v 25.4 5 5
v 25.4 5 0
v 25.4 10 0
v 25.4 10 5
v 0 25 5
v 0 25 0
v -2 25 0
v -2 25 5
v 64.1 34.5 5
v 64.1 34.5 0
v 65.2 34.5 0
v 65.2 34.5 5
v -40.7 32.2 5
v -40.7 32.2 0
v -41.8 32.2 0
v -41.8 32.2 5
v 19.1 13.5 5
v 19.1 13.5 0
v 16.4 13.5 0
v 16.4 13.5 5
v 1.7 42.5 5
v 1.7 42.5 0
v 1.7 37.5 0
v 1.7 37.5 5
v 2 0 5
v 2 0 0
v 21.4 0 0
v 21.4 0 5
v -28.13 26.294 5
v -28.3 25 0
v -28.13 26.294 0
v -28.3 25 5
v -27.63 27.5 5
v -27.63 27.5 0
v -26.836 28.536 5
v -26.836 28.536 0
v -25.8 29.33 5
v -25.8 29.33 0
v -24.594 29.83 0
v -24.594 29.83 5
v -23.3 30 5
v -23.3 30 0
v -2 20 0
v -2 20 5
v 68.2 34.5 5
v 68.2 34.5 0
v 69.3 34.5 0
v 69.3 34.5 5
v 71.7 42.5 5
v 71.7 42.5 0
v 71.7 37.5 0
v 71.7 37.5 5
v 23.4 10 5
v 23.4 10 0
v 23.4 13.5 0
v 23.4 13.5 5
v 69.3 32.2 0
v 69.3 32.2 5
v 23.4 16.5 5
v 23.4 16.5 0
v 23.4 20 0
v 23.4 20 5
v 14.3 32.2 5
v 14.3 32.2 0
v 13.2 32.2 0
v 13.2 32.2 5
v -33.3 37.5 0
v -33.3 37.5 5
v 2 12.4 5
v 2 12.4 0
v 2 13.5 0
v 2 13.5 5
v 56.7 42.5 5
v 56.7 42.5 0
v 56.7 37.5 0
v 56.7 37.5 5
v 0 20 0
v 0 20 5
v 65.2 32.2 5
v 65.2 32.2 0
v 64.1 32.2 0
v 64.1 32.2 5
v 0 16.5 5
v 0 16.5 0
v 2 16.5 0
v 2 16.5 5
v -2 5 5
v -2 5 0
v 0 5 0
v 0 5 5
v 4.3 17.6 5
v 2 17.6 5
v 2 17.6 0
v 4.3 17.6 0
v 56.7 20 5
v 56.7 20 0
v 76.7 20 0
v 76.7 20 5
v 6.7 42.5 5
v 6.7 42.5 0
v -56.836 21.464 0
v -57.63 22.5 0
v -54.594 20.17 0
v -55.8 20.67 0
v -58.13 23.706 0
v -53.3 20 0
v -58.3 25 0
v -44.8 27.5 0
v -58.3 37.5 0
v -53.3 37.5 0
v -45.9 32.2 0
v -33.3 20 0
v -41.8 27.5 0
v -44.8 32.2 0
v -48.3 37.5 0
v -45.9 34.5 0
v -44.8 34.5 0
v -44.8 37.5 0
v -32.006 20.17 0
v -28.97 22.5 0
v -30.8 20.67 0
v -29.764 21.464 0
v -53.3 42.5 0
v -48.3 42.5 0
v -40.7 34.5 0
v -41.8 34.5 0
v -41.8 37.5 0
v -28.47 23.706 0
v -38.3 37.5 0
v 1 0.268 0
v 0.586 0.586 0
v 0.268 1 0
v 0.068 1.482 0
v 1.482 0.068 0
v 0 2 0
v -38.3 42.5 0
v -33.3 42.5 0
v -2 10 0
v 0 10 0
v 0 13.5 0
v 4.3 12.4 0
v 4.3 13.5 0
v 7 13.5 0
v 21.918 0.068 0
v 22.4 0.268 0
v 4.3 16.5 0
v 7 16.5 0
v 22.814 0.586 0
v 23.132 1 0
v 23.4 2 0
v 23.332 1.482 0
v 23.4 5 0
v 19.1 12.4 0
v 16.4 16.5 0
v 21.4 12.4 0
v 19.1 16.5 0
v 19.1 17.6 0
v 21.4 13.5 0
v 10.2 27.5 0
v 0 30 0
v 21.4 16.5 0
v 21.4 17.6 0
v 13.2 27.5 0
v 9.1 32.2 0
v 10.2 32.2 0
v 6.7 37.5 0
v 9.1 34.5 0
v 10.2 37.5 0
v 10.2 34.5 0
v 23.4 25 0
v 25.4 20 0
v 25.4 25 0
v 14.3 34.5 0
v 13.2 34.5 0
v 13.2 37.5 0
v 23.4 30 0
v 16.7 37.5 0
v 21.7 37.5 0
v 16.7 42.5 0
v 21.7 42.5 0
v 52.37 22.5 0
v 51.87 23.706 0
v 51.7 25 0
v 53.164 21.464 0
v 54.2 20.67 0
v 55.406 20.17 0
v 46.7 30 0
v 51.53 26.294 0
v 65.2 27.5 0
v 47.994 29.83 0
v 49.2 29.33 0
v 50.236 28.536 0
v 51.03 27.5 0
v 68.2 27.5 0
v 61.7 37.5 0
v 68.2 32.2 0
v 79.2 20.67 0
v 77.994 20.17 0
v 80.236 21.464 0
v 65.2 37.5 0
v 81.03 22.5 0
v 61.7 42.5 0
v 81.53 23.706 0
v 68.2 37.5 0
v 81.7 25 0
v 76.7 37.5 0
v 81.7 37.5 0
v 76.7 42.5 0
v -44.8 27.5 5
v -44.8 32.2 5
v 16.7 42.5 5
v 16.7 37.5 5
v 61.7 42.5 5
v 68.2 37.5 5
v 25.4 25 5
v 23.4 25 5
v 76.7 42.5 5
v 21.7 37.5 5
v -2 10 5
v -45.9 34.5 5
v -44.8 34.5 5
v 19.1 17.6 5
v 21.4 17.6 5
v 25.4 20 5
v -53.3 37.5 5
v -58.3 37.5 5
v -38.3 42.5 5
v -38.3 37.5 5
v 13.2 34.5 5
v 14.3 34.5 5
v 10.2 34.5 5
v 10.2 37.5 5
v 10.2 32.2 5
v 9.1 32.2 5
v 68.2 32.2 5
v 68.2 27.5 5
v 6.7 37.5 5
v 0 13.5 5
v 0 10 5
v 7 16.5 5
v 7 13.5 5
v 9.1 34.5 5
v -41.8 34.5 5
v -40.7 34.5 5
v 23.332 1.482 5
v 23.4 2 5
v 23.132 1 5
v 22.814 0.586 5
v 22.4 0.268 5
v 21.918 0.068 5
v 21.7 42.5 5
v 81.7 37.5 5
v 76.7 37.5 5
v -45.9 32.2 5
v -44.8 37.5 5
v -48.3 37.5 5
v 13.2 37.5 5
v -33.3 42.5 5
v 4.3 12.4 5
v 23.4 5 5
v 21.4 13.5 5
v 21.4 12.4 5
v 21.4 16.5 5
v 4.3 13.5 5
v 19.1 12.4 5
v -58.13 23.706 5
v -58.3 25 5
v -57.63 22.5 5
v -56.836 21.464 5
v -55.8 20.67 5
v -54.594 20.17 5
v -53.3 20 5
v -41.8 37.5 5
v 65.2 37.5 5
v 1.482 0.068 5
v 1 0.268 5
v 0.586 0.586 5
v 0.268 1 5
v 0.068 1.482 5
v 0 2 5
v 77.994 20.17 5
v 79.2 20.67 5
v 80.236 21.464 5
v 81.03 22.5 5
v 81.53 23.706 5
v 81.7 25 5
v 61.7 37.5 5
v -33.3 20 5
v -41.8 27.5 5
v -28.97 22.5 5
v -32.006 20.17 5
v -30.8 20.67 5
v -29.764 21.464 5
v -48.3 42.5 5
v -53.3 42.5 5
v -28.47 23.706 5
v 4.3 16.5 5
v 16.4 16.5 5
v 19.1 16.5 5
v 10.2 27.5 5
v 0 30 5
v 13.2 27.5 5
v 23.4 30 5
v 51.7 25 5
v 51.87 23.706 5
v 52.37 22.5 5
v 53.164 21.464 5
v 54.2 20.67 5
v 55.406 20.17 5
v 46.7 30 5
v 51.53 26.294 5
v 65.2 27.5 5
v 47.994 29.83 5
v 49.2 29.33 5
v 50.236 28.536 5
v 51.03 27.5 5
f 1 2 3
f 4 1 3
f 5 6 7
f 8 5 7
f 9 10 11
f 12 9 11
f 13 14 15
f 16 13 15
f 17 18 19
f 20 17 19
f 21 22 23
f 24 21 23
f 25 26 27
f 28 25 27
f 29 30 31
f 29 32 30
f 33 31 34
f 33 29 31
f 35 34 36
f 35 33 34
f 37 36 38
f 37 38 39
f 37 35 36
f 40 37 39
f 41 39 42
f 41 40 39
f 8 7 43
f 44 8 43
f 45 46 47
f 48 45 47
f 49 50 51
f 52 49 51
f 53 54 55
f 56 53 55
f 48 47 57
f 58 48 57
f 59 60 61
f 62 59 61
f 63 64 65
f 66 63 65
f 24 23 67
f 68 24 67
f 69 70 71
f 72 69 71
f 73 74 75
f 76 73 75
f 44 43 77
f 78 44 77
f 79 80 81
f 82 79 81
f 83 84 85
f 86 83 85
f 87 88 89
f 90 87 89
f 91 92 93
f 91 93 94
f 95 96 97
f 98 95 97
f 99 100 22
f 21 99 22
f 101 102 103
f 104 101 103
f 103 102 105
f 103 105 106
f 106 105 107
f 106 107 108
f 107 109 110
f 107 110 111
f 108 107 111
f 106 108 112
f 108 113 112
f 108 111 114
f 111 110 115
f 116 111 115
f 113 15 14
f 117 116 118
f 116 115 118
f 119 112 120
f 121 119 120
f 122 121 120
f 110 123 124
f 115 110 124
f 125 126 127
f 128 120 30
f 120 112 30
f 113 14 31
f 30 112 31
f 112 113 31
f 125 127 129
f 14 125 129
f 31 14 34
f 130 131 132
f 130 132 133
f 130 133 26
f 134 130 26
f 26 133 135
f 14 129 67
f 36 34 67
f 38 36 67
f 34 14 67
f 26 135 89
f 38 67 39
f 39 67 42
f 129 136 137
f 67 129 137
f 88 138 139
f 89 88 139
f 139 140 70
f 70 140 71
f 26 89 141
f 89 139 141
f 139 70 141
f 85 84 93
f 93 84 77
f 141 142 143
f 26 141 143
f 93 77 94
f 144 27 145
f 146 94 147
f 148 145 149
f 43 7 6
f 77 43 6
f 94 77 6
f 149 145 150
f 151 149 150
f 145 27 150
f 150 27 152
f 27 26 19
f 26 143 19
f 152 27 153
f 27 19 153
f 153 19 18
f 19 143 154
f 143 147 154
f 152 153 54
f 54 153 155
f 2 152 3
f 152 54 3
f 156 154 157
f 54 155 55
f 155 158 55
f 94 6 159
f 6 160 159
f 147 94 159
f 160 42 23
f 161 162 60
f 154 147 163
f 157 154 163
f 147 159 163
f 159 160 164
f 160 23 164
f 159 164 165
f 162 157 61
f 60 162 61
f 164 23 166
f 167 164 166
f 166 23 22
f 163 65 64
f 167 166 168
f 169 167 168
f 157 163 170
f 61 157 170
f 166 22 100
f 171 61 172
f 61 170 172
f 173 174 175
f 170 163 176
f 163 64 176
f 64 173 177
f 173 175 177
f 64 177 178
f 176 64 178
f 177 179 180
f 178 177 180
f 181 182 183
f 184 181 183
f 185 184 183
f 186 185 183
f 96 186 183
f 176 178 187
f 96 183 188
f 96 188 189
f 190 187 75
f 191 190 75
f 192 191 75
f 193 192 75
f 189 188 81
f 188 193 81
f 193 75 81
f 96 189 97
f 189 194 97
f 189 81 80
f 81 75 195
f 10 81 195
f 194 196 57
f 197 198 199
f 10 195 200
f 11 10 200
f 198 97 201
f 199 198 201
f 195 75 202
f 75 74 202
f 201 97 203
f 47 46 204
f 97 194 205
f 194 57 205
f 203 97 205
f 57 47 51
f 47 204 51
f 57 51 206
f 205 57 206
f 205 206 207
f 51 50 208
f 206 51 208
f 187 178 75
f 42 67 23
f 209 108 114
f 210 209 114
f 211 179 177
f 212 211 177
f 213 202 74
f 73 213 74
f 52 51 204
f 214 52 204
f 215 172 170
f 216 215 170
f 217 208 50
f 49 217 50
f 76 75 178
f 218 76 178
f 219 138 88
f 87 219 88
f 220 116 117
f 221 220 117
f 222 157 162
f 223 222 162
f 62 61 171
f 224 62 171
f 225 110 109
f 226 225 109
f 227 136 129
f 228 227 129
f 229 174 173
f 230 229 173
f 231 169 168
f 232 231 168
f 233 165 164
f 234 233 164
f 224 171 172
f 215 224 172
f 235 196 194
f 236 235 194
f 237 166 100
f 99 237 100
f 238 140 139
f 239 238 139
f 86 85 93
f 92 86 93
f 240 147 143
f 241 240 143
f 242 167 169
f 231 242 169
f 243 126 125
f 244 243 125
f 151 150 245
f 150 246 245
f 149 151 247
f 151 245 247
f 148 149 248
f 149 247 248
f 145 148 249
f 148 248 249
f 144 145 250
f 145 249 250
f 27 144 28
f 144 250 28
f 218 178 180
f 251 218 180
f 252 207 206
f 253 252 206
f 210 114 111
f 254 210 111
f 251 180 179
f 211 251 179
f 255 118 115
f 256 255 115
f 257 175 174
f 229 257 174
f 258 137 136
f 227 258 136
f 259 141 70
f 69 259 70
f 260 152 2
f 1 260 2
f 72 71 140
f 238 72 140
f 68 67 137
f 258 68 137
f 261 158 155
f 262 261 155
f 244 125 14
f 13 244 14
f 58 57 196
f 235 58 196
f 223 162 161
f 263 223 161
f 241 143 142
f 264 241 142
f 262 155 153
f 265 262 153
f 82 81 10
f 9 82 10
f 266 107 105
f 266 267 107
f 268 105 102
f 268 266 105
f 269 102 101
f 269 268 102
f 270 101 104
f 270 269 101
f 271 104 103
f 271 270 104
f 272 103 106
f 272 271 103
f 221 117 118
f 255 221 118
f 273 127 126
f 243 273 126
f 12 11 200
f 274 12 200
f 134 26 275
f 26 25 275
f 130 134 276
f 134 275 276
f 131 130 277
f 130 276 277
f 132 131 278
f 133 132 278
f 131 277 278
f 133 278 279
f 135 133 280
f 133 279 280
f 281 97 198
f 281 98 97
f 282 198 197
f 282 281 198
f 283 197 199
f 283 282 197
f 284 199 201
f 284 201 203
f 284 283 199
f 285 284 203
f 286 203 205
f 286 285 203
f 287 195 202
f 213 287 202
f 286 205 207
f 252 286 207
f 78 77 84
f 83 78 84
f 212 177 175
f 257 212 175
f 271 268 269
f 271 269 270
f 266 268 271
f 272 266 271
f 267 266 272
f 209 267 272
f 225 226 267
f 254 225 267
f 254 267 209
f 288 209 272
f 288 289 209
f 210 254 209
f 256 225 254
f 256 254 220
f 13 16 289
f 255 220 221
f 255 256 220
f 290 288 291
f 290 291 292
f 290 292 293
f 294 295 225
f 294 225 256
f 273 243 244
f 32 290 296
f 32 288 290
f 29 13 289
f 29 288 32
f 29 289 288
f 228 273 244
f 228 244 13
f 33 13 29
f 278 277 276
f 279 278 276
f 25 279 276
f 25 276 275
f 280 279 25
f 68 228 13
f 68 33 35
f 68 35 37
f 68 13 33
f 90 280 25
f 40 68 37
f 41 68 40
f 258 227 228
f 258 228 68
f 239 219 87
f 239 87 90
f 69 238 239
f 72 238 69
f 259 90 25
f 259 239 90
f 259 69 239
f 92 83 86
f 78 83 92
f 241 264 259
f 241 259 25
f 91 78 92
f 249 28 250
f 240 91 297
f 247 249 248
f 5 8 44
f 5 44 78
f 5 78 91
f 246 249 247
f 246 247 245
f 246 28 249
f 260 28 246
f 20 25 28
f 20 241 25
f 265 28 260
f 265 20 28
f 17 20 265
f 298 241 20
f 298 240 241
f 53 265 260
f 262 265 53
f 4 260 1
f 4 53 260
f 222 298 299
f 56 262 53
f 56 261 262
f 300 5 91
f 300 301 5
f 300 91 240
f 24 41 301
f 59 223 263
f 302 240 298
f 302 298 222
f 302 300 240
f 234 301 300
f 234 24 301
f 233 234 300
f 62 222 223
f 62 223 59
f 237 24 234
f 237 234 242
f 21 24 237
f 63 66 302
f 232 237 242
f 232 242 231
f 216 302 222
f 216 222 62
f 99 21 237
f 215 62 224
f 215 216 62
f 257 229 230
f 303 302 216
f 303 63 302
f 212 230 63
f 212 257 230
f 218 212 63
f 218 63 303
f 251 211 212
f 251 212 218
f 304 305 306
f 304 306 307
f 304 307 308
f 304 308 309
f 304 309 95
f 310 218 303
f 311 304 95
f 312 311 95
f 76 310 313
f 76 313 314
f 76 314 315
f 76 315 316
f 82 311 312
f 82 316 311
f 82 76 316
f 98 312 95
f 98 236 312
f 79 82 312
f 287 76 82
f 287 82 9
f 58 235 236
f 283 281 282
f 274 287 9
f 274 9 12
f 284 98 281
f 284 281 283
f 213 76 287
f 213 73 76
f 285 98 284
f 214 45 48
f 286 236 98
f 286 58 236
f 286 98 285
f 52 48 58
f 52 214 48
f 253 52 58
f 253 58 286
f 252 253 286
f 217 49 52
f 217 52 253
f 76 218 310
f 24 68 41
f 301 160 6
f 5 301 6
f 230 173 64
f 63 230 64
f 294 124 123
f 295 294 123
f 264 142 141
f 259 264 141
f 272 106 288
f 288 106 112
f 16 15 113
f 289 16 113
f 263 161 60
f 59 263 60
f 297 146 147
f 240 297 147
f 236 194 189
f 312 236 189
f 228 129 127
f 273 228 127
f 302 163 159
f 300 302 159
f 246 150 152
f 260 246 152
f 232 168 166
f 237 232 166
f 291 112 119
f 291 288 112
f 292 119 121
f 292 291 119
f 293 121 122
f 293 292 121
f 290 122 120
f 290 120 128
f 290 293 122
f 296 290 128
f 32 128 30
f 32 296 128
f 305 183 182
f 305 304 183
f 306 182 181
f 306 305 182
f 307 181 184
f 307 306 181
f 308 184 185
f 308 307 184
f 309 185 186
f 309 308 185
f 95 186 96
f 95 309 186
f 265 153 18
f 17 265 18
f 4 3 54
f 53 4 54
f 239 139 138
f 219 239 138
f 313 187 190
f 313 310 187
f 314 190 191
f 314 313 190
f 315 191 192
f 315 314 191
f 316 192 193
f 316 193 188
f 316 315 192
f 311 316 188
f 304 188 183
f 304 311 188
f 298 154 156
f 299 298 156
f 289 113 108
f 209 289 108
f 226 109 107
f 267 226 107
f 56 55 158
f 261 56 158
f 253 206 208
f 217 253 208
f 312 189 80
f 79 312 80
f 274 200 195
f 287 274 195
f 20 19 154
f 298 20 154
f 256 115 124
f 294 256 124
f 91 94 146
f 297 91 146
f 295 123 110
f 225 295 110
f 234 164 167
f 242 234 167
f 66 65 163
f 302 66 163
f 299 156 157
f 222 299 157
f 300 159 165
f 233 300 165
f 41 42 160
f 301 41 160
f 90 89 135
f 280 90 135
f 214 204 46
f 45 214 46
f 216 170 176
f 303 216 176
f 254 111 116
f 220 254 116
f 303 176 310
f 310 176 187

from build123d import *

# Parameters (mm, degrees)
BOSS_EXTRU_1_DEPTH = 5
CONG_1_R           = 5
FILLET1_R          = 2


with BuildPart() as part:
    # Esquisse1 → Boss.-Extru.1 (new body)
    with BuildSketch(Plane.XY):
        Polygon((25.4, 25), (23.4, 25), (23.4, 30), (51.7, 30), (51.7, 20), (81.7, 20), (81.7, 37.5), (76.7, 37.5), (76.7, 42.5), (71.7, 42.5), (71.7, 37.5), (68.2, 37.5), (68.2, 34.5), (69.3, 34.5), (69.3, 32.2), (68.2, 32.2), (68.2, 27.5), (65.2, 27.5), (65.2, 32.2), (64.1, 32.2), (64.1, 34.5), (65.2, 34.5), (65.2, 37.5), (61.7, 37.5), (61.7, 42.5), (56.7, 42.5), (56.7, 37.5), (21.7, 37.5), (21.7, 42.5), (16.7, 42.5), (16.7, 37.5), (13.2, 37.5), (13.2, 34.5), (14.3, 34.5), (14.3, 32.2), (13.2, 32.2), (13.2, 27.5), (10.2, 27.5), (10.2, 32.2), (9.1, 32.2), (9.1, 34.5), (10.2, 34.5), (10.2, 37.5), (6.7, 37.5), (6.7, 42.5), (1.7, 42.5), (1.7, 37.5), (-33.3, 37.5), (-33.3, 42.5), (-38.3, 42.5), (-38.3, 37.5), (-41.8, 37.5), (-41.8, 34.5), (-40.7, 34.5), (-40.7, 32.2), (-41.8, 32.2), (-41.8, 27.5), (-44.8, 27.5), (-44.8, 32.2), (-45.9, 32.2), (-45.9, 34.5), (-44.8, 34.5), (-44.8, 37.5), (-48.3, 37.5), (-48.3, 42.5), (-53.3, 42.5), (-53.3, 37.5), (-58.3, 37.5), (-58.3, 20), (-28.3, 20), (-28.3, 30), (0, 30), (0, 25), (-2, 25), (-2, 20), (0, 20), (0, 16.5), (2, 16.5), (2, 17.6), (4.3, 17.6), (4.3, 16.5), (7, 16.5), (7, 13.5), (4.3, 13.5), (4.3, 12.4), (2, 12.4), (2, 13.5), (0, 13.5), (0, 10), (-2, 10), (-2, 5), (0, 5), (0, 0), (23.4, 0), (23.4, 5), (25.4, 5), (25.4, 10), (23.4, 10), (23.4, 13.5), (21.4, 13.5), (21.4, 12.4), (19.1, 12.4), (19.1, 13.5), (16.4, 13.5), (16.4, 16.5), (19.1, 16.5), (19.1, 17.6), (21.4, 17.6), (21.4, 16.5), (23.4, 16.5), (23.4, 20), (25.4, 20), align=None)
    extrude(amount=BOSS_EXTRU_1_DEPTH)

    # Congé1
    cong_1_edges = [part.edges().sort_by_distance(p)[0] for p in [
        (-28.3, 30, 2.5),
        (-58.3, 20, 2.5),
        (-28.3, 20, 2.5),
        (81.7, 20, 2.5),
        (51.7, 20, 2.5),
        (51.7, 30, 2.5),
    ]]
    fillet(cong_1_edges, radius=CONG_1_R - 0.0001)  # a hair under: the kernel refuses the full size

    # Fillet1
    fillet1_edges = [part.edges().sort_by_distance(p)[0] for p in [
        (23.4, 0, 2.5),
        (0, 0, 2.5),
    ]]
    fillet(fillet1_edges, radius=FILLET1_R)


solid = part.part
